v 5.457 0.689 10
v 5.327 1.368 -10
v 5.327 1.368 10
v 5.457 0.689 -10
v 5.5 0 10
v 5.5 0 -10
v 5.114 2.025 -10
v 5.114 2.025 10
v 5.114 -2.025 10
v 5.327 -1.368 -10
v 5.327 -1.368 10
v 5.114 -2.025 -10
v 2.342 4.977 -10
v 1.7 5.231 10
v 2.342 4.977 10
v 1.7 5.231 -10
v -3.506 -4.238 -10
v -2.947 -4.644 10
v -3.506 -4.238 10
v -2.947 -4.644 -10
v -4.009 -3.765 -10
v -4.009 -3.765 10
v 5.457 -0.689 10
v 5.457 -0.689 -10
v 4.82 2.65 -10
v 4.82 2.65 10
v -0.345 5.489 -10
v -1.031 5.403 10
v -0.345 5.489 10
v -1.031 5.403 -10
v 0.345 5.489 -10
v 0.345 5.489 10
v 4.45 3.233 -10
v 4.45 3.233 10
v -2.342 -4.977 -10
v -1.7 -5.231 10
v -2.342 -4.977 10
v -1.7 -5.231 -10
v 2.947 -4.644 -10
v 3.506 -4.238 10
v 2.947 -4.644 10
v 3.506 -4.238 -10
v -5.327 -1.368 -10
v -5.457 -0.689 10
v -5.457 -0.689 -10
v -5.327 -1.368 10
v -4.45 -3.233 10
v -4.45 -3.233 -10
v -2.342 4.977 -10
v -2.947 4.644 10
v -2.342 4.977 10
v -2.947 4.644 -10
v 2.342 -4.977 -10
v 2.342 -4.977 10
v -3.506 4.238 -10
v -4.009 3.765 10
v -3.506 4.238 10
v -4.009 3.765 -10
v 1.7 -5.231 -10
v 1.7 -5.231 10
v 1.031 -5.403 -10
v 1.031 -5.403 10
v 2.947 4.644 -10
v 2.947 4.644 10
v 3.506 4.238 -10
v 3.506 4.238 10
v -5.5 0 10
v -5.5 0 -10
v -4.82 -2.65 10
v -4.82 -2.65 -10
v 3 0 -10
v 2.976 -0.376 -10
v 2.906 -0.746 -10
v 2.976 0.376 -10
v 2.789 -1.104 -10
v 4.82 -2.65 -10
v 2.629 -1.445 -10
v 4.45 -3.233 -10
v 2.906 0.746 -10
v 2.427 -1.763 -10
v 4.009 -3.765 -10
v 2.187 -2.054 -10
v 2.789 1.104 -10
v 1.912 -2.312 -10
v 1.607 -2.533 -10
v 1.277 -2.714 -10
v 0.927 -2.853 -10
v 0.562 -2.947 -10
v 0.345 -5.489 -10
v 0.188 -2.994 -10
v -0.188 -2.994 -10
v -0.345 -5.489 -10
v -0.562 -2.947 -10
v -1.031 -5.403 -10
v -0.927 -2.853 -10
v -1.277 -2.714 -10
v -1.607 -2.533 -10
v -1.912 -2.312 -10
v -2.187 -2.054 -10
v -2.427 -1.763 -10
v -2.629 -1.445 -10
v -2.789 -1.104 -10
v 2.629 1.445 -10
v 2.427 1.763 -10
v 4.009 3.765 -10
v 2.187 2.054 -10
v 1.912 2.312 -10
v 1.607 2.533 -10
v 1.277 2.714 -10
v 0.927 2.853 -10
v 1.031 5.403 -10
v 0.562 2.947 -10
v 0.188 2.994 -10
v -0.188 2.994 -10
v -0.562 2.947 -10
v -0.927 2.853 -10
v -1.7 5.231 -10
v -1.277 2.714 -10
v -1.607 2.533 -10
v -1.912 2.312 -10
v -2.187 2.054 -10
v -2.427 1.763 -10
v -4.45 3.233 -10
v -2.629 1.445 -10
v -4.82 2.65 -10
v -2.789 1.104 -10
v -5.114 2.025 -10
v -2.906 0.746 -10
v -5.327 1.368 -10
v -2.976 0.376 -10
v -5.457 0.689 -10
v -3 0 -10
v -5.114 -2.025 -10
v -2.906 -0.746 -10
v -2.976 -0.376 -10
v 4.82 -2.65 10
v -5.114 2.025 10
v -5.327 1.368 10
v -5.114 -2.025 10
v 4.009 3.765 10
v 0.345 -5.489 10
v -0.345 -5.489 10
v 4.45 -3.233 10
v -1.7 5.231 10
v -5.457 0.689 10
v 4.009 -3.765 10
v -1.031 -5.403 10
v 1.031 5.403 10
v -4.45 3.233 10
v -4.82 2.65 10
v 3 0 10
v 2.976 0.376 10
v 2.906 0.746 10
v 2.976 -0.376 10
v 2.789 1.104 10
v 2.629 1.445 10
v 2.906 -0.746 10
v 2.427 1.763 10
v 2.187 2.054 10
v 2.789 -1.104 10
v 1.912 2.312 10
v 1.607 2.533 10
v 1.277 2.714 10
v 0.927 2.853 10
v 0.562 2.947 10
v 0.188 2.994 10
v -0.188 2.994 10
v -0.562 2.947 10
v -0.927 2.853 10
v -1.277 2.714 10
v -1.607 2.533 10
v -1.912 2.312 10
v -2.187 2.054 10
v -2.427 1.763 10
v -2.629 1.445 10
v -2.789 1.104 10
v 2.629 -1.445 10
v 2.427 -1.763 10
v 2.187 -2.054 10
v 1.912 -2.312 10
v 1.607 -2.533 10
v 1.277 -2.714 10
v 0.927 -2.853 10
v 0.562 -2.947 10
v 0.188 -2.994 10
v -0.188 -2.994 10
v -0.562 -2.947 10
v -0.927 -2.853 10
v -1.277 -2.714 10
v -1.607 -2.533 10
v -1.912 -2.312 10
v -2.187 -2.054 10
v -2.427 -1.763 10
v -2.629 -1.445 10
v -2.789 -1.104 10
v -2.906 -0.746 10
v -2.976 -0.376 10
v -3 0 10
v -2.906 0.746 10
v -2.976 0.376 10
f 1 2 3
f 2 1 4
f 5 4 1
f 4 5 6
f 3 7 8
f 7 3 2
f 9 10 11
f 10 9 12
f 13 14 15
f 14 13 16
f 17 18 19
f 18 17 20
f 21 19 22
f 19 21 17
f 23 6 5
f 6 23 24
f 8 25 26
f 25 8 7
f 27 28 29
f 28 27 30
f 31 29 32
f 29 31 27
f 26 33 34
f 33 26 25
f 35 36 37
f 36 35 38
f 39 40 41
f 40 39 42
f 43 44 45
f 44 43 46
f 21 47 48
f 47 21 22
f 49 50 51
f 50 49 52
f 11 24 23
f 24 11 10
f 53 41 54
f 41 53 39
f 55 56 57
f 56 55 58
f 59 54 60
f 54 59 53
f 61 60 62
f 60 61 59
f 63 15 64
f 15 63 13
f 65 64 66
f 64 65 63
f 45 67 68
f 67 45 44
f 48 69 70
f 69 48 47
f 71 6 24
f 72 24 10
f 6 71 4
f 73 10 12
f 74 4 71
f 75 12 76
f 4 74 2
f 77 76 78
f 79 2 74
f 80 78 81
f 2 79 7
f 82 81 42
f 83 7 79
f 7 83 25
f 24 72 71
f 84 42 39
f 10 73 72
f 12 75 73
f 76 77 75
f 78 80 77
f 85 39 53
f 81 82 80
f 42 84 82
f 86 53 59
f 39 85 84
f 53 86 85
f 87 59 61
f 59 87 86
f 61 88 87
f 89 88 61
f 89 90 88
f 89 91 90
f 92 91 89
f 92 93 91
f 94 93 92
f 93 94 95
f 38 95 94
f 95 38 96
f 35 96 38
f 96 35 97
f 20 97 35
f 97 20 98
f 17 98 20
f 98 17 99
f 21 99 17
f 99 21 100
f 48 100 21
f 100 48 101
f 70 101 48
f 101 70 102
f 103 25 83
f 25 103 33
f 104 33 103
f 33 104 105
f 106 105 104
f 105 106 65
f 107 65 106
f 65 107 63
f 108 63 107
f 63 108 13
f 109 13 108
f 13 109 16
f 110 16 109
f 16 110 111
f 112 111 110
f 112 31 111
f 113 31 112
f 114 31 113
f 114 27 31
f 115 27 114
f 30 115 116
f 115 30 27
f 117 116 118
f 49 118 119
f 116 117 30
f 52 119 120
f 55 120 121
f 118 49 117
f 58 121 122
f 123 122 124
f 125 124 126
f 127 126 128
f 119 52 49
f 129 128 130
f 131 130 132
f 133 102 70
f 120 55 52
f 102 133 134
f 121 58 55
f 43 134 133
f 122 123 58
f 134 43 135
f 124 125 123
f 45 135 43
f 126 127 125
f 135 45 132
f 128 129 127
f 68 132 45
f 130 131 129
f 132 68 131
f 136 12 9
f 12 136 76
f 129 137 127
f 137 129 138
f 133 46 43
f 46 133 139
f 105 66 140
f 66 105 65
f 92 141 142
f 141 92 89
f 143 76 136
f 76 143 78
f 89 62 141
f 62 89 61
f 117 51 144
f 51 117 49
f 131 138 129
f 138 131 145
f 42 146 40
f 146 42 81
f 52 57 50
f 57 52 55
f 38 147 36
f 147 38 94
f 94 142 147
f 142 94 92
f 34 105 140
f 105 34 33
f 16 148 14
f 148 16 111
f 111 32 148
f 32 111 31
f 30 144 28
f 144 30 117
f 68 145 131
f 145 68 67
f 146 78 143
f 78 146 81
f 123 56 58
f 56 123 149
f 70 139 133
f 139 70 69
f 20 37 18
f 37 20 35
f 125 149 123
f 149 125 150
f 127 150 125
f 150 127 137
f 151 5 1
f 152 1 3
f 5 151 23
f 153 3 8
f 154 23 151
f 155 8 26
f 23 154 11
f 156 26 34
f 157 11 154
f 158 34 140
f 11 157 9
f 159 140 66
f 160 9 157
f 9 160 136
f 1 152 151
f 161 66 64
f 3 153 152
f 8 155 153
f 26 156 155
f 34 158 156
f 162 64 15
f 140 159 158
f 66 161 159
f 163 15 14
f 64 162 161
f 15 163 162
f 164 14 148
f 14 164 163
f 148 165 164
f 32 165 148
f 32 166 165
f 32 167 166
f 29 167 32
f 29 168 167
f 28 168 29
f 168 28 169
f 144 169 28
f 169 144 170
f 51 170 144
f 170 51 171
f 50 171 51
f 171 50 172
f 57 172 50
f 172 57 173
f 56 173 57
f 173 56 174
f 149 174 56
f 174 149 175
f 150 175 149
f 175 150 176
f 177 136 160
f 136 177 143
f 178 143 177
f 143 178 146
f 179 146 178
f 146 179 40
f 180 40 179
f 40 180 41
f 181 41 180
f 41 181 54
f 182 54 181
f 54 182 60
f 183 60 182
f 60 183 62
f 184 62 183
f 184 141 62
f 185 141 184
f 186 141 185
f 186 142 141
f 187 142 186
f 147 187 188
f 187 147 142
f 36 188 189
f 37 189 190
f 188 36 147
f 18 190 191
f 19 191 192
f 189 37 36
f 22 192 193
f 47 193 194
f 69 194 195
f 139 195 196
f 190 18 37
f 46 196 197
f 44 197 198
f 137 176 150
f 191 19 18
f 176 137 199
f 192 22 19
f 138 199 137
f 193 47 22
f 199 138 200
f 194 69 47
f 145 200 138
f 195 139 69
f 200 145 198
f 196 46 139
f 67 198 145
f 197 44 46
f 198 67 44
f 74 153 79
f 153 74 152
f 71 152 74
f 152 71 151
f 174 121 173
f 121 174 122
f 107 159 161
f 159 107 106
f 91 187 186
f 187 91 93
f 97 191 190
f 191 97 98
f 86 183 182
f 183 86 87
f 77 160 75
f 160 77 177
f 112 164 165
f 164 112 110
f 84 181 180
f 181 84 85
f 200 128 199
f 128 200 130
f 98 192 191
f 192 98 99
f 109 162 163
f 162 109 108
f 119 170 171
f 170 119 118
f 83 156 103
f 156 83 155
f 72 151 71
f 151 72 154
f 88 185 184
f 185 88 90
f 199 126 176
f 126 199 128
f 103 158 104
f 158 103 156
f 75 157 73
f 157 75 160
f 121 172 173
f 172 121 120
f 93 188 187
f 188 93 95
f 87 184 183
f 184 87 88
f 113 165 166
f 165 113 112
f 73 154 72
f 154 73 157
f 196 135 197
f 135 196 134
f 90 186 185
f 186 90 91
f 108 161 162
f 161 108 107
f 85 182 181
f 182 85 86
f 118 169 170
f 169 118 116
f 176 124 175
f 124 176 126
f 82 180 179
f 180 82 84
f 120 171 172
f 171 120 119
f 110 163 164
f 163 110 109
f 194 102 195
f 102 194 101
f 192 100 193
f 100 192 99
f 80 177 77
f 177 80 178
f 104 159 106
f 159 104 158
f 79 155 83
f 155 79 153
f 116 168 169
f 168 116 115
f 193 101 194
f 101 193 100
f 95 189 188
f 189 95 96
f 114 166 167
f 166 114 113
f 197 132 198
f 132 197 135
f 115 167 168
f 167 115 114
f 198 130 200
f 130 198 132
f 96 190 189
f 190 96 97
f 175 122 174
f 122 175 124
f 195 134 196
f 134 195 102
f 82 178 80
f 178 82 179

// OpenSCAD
$fn = 50;


difference() {
	union() {
		translate(v = [0, 0, -10.0000000000]) {
			cylinder(h = 20, r = 5.5000000000);
		}
	}
	union() {
		translate(v = [0, 0, -100.0000000000]) {
			cylinder(h = 200, r = 3.0000000000);
		}
	}
}
